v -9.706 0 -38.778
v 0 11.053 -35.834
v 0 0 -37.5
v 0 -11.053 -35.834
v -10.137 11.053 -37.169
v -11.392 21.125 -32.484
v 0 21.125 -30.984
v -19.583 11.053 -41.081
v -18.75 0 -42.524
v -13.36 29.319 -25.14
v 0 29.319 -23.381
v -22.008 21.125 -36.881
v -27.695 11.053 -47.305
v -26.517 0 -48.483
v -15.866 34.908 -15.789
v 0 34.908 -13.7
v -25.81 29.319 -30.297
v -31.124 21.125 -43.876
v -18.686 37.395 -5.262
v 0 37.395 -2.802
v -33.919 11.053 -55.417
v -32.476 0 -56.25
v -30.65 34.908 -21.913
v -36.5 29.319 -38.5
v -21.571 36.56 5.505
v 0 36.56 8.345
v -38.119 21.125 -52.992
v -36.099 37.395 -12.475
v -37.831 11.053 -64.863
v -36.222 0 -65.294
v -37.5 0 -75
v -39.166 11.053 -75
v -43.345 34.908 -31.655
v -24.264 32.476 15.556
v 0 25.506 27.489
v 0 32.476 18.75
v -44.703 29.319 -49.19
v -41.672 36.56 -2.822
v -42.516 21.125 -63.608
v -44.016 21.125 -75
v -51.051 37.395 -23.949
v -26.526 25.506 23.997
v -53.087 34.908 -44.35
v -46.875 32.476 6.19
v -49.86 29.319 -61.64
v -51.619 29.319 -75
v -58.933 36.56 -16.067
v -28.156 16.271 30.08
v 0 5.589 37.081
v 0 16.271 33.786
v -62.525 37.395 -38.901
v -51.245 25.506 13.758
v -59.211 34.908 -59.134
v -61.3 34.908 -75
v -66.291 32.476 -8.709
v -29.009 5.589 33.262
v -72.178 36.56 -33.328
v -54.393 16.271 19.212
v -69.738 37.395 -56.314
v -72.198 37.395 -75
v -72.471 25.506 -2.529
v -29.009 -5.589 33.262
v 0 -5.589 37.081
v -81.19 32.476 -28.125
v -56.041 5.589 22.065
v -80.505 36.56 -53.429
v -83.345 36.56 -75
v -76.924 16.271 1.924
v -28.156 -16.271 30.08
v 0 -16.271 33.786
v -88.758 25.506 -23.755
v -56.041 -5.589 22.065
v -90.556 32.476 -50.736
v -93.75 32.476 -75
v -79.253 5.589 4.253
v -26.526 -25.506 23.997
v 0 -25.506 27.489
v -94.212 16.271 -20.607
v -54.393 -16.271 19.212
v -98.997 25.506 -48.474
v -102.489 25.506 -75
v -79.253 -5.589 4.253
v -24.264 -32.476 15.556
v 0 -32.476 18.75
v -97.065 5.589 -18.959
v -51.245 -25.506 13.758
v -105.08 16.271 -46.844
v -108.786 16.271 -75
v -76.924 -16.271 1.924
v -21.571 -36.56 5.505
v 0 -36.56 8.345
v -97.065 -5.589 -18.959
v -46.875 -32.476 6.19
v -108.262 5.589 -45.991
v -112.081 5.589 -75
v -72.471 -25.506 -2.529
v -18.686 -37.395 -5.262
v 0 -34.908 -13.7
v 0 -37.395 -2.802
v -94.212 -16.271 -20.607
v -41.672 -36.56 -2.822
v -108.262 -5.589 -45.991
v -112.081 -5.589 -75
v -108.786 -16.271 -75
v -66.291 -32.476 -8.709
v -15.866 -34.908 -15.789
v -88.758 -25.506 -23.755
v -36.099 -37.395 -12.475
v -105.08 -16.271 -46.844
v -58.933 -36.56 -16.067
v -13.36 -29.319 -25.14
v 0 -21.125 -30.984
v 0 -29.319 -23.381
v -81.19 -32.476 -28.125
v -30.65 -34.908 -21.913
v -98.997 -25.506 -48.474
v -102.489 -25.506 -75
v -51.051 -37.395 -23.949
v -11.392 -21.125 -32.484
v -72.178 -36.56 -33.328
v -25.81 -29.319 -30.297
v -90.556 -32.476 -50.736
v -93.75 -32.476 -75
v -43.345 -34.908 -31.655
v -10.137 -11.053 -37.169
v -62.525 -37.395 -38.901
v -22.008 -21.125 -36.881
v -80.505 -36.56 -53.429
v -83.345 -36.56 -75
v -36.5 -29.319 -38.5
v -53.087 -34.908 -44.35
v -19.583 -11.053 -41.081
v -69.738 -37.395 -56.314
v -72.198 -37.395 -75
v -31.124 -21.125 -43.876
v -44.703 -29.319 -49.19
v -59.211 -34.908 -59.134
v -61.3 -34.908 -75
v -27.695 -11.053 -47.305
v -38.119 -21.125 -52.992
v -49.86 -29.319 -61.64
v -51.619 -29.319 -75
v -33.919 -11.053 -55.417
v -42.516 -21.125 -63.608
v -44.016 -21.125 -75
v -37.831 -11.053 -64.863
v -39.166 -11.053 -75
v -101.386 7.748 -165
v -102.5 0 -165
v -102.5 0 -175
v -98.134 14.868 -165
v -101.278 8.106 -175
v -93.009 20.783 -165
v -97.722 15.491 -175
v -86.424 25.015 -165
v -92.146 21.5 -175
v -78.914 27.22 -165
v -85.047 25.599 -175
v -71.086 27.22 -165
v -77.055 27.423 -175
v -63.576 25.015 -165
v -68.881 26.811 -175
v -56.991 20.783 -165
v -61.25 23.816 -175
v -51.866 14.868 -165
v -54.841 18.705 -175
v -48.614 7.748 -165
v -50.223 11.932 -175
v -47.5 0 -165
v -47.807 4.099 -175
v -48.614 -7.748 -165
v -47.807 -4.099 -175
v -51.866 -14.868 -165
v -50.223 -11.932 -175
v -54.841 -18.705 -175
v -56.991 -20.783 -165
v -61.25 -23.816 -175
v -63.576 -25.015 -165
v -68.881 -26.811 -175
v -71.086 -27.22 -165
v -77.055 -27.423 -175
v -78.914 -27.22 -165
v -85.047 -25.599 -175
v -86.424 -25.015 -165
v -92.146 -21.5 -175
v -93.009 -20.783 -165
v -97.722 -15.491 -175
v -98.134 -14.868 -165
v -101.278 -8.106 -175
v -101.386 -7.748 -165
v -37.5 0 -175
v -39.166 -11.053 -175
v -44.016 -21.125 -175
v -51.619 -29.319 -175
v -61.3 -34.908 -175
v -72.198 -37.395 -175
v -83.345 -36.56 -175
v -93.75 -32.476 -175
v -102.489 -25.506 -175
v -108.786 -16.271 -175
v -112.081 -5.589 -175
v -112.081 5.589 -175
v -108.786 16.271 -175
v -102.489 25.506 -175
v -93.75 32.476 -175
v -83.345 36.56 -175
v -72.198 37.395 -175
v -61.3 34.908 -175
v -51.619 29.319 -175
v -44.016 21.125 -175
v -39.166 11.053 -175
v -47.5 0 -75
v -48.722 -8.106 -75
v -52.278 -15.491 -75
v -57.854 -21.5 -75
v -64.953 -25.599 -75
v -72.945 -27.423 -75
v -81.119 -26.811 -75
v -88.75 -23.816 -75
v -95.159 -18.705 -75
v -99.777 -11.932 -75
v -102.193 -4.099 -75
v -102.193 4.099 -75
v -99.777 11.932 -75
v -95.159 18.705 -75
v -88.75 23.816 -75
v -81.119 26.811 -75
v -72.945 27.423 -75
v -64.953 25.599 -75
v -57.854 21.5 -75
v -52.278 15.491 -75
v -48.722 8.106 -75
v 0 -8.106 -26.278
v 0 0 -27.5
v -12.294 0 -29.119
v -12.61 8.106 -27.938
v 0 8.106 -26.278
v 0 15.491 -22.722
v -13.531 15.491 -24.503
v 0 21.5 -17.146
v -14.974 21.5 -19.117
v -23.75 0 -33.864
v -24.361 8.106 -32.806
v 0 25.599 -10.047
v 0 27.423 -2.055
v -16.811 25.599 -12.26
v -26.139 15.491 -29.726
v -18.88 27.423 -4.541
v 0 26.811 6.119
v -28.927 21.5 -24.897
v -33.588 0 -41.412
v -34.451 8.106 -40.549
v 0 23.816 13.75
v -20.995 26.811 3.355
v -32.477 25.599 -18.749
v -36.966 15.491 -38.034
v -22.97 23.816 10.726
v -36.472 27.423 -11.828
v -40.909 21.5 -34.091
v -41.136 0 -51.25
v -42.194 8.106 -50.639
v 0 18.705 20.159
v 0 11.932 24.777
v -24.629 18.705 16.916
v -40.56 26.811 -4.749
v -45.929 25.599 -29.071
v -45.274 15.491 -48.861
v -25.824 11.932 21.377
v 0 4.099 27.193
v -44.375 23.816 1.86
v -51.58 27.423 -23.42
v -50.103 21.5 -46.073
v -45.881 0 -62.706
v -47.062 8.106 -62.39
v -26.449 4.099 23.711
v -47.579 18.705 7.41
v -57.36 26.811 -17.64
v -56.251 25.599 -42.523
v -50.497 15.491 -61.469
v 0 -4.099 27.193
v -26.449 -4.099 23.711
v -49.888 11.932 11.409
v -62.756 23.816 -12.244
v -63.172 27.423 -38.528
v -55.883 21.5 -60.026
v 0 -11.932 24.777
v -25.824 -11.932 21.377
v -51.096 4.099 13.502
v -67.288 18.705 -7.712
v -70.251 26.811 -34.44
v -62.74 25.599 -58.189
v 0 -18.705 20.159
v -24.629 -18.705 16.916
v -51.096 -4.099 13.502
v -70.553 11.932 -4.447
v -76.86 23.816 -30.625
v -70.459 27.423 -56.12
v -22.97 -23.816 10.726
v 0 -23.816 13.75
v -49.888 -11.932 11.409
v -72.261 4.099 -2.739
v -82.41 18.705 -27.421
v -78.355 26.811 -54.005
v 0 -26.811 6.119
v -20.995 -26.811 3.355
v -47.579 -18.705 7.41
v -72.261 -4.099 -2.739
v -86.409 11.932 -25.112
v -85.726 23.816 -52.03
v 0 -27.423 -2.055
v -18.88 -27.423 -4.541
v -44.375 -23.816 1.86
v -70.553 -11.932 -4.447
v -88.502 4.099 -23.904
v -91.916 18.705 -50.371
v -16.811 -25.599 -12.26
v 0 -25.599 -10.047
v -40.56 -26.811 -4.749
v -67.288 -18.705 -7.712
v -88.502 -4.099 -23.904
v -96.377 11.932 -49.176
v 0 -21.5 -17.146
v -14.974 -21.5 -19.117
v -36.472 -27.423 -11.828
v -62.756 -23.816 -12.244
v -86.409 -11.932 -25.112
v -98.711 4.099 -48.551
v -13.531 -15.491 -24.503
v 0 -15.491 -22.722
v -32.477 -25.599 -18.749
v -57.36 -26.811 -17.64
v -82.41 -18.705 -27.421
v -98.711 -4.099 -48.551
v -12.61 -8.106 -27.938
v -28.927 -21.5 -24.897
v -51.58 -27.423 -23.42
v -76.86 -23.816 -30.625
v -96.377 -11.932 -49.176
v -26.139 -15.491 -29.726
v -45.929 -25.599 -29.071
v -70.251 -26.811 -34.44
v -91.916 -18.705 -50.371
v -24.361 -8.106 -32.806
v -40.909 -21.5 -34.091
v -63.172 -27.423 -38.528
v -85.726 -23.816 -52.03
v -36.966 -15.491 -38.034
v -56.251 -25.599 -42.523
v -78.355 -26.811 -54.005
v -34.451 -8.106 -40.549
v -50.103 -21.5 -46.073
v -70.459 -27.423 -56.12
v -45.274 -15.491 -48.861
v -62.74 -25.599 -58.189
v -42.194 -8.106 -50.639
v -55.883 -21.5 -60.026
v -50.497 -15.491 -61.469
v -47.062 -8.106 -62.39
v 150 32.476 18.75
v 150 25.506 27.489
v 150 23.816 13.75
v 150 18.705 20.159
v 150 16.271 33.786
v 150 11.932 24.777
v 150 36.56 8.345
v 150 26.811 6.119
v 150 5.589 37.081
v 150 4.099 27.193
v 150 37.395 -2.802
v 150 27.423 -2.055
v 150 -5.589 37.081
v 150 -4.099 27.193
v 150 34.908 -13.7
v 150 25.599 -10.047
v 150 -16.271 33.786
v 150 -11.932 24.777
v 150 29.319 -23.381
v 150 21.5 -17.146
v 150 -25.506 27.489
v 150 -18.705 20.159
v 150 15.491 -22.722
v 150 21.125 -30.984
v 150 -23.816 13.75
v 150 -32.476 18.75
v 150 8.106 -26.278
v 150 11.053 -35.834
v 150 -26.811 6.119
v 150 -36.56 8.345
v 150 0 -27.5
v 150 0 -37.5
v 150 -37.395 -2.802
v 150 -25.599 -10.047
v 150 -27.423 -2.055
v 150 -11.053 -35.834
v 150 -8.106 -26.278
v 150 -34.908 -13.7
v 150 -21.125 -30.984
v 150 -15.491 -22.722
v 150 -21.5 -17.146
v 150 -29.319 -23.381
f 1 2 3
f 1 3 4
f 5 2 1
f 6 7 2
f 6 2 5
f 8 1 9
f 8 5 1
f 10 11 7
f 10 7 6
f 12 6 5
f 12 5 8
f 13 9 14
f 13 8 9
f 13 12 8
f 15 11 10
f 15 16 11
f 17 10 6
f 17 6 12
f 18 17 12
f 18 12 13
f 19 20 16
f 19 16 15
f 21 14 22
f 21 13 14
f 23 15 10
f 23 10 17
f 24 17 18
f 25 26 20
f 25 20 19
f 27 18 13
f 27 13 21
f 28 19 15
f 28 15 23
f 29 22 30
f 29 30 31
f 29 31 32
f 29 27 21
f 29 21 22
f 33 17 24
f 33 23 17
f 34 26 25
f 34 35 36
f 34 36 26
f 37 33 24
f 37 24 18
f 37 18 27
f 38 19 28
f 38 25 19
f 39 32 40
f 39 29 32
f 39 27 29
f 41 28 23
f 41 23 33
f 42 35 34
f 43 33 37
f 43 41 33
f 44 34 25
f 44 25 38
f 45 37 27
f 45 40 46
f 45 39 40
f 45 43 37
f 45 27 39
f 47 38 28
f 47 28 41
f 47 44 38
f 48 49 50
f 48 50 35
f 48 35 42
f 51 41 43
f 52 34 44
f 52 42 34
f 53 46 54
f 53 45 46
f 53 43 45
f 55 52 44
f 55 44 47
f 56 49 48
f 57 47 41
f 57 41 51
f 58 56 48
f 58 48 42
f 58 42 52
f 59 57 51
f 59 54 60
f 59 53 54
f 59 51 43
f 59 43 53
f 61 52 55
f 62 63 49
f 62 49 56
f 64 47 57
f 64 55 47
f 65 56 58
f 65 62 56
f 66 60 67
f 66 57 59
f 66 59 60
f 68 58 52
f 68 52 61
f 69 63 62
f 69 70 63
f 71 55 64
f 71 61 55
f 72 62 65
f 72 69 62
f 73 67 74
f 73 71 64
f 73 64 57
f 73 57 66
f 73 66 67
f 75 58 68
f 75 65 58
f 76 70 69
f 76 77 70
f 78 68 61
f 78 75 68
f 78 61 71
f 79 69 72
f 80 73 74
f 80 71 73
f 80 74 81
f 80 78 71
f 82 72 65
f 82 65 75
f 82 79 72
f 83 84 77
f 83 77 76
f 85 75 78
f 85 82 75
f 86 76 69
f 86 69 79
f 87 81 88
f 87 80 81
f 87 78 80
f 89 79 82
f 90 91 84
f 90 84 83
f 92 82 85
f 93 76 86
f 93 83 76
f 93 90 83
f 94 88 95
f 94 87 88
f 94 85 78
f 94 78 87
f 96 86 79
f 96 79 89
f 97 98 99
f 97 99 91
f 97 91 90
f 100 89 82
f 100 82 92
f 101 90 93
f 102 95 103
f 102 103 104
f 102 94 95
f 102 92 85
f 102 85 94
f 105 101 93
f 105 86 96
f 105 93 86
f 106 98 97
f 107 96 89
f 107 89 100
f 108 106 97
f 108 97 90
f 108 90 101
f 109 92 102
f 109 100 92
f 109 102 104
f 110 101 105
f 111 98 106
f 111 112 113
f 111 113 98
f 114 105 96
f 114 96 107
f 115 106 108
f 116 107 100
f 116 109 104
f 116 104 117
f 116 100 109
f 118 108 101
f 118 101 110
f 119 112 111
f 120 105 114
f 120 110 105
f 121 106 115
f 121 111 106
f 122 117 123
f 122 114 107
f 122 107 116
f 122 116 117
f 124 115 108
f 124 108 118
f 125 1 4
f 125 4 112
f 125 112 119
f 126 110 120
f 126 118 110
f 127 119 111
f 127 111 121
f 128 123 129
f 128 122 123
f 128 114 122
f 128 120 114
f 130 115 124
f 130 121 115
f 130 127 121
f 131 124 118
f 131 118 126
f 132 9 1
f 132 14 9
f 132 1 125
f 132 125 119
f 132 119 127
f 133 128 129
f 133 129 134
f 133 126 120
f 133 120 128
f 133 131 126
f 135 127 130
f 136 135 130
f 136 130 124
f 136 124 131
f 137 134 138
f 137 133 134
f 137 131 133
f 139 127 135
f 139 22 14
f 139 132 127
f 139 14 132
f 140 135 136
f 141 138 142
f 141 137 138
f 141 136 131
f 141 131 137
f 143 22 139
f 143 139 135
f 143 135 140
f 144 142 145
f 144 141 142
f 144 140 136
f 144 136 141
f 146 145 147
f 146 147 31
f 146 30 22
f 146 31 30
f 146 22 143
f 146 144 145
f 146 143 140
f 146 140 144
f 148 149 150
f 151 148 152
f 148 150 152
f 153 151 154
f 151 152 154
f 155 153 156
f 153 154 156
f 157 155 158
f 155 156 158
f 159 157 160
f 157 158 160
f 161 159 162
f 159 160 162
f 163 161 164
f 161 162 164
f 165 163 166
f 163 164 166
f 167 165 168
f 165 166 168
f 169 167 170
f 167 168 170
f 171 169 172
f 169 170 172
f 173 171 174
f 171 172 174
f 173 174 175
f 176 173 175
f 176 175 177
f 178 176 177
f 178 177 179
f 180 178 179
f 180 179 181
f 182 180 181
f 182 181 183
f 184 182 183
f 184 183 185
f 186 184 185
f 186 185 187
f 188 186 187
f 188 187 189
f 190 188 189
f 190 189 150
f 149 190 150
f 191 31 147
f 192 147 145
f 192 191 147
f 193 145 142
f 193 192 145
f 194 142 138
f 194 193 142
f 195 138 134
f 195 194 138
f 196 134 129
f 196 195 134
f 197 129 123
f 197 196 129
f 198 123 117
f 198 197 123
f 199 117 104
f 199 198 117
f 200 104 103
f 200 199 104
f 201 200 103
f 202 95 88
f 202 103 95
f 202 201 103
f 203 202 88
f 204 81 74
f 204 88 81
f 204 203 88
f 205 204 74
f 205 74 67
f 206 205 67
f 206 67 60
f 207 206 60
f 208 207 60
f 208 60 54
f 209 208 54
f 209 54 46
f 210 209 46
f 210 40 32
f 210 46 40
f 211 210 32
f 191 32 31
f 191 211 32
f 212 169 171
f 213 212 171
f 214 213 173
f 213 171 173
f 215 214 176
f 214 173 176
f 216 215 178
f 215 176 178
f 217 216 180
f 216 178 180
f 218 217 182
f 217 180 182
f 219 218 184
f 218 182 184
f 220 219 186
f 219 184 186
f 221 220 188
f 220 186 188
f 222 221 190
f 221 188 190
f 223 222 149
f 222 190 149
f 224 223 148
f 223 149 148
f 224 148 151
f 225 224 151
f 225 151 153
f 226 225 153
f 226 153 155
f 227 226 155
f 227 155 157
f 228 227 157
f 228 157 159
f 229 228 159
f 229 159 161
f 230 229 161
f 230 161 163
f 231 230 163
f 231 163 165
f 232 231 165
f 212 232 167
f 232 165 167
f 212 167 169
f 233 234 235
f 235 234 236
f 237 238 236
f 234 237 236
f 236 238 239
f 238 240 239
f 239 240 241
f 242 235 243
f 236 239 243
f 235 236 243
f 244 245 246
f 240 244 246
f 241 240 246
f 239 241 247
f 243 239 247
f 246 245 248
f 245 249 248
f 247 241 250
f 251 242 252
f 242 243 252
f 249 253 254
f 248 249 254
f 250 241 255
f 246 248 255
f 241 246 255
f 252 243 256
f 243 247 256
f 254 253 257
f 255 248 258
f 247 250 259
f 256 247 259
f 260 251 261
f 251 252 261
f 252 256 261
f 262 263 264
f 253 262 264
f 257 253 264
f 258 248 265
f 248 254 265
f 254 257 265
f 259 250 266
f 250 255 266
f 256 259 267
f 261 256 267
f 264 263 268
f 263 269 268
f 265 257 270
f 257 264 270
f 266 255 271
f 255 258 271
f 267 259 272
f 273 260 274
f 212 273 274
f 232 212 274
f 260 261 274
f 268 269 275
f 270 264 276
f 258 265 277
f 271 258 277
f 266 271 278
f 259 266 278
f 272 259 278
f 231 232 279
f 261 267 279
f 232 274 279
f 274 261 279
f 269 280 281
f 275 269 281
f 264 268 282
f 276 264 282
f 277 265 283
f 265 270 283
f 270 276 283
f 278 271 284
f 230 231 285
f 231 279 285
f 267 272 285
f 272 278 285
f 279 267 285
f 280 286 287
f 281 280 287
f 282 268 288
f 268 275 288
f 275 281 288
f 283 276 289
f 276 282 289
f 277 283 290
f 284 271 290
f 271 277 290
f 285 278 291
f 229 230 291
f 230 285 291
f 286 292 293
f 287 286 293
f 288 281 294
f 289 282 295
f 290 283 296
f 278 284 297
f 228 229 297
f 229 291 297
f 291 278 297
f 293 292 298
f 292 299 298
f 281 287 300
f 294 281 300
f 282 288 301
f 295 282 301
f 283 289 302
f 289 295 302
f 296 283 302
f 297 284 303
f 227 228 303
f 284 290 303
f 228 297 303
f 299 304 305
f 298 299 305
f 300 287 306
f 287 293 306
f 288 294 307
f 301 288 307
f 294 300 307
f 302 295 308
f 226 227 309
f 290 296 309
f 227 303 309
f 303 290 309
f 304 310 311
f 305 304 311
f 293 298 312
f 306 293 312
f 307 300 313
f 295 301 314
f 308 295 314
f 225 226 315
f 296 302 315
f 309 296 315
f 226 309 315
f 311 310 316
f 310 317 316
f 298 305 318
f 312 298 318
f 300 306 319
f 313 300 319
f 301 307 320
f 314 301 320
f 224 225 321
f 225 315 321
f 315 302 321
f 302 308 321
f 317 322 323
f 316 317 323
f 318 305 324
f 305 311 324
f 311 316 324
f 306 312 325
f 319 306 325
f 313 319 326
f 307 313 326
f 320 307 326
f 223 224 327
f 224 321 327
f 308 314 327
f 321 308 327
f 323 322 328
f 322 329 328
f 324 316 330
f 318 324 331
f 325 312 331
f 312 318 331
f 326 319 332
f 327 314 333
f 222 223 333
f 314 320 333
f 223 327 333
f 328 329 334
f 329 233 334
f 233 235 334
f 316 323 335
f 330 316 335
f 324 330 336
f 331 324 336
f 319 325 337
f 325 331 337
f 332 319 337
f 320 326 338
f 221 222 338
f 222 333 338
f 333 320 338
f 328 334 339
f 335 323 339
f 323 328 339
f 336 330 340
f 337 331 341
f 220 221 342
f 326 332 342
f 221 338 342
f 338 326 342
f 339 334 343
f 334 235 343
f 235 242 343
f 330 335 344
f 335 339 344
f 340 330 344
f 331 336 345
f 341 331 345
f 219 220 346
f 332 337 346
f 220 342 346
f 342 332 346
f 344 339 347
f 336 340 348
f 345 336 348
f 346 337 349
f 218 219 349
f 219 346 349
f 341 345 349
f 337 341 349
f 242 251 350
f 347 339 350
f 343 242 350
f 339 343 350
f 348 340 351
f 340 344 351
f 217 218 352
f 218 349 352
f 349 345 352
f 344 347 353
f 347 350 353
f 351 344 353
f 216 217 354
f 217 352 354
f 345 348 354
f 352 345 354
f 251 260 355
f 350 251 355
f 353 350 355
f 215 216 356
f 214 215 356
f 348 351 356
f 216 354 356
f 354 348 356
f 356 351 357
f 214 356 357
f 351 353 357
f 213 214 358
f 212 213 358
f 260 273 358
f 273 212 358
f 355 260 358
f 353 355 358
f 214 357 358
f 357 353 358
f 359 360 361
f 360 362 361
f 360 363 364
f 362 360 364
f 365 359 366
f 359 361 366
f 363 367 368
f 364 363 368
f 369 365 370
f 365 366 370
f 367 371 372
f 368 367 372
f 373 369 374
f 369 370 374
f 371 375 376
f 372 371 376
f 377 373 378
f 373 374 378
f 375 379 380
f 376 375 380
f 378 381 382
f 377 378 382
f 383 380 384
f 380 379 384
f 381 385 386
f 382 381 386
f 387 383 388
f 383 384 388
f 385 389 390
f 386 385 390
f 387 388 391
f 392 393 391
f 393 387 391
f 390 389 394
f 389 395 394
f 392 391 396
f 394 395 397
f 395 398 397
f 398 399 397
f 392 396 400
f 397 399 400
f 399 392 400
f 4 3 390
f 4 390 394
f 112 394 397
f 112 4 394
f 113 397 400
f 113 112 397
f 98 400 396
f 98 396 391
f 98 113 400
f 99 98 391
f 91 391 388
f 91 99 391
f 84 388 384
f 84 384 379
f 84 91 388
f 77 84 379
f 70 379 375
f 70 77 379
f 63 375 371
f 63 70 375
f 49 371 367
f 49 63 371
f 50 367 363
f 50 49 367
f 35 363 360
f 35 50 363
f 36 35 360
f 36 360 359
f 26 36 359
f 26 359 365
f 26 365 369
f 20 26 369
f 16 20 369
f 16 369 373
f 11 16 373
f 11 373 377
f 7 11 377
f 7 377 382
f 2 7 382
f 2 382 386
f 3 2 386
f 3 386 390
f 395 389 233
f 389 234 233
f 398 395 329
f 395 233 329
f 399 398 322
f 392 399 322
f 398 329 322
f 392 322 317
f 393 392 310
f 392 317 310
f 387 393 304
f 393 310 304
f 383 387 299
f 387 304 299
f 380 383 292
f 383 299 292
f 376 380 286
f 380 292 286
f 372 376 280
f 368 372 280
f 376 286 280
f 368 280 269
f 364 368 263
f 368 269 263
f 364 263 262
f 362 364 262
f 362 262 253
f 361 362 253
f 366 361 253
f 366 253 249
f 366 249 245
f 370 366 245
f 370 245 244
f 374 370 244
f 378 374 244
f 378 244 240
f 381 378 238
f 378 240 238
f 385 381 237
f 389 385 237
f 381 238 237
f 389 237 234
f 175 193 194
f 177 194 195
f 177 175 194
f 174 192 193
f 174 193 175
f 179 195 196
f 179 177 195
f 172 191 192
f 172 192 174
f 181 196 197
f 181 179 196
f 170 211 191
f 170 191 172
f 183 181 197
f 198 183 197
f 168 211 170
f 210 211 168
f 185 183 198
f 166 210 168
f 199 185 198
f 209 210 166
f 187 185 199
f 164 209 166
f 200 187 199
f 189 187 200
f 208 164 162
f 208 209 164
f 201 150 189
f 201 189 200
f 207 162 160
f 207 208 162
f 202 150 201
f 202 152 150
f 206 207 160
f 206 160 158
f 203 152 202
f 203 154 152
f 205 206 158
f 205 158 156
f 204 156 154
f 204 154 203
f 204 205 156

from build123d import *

# Parameters (mm, degrees)
SWEEP1_PROFILE_R   = 37.5
SHELL1_T           = -10
CUT_EXTRUDE1_REACH = 264.797
SKETCH4_R          = 27.5


with BuildPart() as part:
    # Sweep1: sweep along a path in Sketch2
    with BuildLine(Plane(origin=(0, 0, 0), x_dir=(1, 0, 0), z_dir=(0, 1, 0))) as sweep1_path:
        Line((150, 0), (0, 0))
        ThreePointArc((0, 0), (-53.033008589, 21.966991411), (-75, 75))
        Line((-75, 75), (-75, 175))
    # Sweep1 profile (on start of the path) → Sweep1 (sweep)
    with BuildSketch(Plane(origin=(150, 0, 0), x_dir=(0, 0, -1), z_dir=(-1, 0, 0))):
        Circle(SWEEP1_PROFILE_R)
    sweep(path=sweep1_path.line)

    # Shell1
    shell1_openings = [part.faces().sort_by_distance(p)[0] for p in [
        (150, 0, 0),
    ]]
    offset(amount=SHELL1_T, openings=shell1_openings, kind=Kind.INTERSECTION)

    # Sketch4 → Cut-Extrude1 (cut, up to next)
    with BuildSketch(Plane(origin=(0, 0, -175), x_dir=(-1, 0, 0), z_dir=(0, 0, -1)), mode=Mode.PRIVATE) as cut_extrude1_sk1:
        with Locations((75, 0)):
            Circle(SKETCH4_R)
    cut_extrude1_tool1 = extrude(cut_extrude1_sk1.sketch, amount=-CUT_EXTRUDE1_REACH, mode=Mode.PRIVATE) & part.part
    add(cut_extrude1_tool1.solids().sort_by_distance((-75, 0, -175))[0], mode=Mode.SUBTRACT)


solid = part.part
